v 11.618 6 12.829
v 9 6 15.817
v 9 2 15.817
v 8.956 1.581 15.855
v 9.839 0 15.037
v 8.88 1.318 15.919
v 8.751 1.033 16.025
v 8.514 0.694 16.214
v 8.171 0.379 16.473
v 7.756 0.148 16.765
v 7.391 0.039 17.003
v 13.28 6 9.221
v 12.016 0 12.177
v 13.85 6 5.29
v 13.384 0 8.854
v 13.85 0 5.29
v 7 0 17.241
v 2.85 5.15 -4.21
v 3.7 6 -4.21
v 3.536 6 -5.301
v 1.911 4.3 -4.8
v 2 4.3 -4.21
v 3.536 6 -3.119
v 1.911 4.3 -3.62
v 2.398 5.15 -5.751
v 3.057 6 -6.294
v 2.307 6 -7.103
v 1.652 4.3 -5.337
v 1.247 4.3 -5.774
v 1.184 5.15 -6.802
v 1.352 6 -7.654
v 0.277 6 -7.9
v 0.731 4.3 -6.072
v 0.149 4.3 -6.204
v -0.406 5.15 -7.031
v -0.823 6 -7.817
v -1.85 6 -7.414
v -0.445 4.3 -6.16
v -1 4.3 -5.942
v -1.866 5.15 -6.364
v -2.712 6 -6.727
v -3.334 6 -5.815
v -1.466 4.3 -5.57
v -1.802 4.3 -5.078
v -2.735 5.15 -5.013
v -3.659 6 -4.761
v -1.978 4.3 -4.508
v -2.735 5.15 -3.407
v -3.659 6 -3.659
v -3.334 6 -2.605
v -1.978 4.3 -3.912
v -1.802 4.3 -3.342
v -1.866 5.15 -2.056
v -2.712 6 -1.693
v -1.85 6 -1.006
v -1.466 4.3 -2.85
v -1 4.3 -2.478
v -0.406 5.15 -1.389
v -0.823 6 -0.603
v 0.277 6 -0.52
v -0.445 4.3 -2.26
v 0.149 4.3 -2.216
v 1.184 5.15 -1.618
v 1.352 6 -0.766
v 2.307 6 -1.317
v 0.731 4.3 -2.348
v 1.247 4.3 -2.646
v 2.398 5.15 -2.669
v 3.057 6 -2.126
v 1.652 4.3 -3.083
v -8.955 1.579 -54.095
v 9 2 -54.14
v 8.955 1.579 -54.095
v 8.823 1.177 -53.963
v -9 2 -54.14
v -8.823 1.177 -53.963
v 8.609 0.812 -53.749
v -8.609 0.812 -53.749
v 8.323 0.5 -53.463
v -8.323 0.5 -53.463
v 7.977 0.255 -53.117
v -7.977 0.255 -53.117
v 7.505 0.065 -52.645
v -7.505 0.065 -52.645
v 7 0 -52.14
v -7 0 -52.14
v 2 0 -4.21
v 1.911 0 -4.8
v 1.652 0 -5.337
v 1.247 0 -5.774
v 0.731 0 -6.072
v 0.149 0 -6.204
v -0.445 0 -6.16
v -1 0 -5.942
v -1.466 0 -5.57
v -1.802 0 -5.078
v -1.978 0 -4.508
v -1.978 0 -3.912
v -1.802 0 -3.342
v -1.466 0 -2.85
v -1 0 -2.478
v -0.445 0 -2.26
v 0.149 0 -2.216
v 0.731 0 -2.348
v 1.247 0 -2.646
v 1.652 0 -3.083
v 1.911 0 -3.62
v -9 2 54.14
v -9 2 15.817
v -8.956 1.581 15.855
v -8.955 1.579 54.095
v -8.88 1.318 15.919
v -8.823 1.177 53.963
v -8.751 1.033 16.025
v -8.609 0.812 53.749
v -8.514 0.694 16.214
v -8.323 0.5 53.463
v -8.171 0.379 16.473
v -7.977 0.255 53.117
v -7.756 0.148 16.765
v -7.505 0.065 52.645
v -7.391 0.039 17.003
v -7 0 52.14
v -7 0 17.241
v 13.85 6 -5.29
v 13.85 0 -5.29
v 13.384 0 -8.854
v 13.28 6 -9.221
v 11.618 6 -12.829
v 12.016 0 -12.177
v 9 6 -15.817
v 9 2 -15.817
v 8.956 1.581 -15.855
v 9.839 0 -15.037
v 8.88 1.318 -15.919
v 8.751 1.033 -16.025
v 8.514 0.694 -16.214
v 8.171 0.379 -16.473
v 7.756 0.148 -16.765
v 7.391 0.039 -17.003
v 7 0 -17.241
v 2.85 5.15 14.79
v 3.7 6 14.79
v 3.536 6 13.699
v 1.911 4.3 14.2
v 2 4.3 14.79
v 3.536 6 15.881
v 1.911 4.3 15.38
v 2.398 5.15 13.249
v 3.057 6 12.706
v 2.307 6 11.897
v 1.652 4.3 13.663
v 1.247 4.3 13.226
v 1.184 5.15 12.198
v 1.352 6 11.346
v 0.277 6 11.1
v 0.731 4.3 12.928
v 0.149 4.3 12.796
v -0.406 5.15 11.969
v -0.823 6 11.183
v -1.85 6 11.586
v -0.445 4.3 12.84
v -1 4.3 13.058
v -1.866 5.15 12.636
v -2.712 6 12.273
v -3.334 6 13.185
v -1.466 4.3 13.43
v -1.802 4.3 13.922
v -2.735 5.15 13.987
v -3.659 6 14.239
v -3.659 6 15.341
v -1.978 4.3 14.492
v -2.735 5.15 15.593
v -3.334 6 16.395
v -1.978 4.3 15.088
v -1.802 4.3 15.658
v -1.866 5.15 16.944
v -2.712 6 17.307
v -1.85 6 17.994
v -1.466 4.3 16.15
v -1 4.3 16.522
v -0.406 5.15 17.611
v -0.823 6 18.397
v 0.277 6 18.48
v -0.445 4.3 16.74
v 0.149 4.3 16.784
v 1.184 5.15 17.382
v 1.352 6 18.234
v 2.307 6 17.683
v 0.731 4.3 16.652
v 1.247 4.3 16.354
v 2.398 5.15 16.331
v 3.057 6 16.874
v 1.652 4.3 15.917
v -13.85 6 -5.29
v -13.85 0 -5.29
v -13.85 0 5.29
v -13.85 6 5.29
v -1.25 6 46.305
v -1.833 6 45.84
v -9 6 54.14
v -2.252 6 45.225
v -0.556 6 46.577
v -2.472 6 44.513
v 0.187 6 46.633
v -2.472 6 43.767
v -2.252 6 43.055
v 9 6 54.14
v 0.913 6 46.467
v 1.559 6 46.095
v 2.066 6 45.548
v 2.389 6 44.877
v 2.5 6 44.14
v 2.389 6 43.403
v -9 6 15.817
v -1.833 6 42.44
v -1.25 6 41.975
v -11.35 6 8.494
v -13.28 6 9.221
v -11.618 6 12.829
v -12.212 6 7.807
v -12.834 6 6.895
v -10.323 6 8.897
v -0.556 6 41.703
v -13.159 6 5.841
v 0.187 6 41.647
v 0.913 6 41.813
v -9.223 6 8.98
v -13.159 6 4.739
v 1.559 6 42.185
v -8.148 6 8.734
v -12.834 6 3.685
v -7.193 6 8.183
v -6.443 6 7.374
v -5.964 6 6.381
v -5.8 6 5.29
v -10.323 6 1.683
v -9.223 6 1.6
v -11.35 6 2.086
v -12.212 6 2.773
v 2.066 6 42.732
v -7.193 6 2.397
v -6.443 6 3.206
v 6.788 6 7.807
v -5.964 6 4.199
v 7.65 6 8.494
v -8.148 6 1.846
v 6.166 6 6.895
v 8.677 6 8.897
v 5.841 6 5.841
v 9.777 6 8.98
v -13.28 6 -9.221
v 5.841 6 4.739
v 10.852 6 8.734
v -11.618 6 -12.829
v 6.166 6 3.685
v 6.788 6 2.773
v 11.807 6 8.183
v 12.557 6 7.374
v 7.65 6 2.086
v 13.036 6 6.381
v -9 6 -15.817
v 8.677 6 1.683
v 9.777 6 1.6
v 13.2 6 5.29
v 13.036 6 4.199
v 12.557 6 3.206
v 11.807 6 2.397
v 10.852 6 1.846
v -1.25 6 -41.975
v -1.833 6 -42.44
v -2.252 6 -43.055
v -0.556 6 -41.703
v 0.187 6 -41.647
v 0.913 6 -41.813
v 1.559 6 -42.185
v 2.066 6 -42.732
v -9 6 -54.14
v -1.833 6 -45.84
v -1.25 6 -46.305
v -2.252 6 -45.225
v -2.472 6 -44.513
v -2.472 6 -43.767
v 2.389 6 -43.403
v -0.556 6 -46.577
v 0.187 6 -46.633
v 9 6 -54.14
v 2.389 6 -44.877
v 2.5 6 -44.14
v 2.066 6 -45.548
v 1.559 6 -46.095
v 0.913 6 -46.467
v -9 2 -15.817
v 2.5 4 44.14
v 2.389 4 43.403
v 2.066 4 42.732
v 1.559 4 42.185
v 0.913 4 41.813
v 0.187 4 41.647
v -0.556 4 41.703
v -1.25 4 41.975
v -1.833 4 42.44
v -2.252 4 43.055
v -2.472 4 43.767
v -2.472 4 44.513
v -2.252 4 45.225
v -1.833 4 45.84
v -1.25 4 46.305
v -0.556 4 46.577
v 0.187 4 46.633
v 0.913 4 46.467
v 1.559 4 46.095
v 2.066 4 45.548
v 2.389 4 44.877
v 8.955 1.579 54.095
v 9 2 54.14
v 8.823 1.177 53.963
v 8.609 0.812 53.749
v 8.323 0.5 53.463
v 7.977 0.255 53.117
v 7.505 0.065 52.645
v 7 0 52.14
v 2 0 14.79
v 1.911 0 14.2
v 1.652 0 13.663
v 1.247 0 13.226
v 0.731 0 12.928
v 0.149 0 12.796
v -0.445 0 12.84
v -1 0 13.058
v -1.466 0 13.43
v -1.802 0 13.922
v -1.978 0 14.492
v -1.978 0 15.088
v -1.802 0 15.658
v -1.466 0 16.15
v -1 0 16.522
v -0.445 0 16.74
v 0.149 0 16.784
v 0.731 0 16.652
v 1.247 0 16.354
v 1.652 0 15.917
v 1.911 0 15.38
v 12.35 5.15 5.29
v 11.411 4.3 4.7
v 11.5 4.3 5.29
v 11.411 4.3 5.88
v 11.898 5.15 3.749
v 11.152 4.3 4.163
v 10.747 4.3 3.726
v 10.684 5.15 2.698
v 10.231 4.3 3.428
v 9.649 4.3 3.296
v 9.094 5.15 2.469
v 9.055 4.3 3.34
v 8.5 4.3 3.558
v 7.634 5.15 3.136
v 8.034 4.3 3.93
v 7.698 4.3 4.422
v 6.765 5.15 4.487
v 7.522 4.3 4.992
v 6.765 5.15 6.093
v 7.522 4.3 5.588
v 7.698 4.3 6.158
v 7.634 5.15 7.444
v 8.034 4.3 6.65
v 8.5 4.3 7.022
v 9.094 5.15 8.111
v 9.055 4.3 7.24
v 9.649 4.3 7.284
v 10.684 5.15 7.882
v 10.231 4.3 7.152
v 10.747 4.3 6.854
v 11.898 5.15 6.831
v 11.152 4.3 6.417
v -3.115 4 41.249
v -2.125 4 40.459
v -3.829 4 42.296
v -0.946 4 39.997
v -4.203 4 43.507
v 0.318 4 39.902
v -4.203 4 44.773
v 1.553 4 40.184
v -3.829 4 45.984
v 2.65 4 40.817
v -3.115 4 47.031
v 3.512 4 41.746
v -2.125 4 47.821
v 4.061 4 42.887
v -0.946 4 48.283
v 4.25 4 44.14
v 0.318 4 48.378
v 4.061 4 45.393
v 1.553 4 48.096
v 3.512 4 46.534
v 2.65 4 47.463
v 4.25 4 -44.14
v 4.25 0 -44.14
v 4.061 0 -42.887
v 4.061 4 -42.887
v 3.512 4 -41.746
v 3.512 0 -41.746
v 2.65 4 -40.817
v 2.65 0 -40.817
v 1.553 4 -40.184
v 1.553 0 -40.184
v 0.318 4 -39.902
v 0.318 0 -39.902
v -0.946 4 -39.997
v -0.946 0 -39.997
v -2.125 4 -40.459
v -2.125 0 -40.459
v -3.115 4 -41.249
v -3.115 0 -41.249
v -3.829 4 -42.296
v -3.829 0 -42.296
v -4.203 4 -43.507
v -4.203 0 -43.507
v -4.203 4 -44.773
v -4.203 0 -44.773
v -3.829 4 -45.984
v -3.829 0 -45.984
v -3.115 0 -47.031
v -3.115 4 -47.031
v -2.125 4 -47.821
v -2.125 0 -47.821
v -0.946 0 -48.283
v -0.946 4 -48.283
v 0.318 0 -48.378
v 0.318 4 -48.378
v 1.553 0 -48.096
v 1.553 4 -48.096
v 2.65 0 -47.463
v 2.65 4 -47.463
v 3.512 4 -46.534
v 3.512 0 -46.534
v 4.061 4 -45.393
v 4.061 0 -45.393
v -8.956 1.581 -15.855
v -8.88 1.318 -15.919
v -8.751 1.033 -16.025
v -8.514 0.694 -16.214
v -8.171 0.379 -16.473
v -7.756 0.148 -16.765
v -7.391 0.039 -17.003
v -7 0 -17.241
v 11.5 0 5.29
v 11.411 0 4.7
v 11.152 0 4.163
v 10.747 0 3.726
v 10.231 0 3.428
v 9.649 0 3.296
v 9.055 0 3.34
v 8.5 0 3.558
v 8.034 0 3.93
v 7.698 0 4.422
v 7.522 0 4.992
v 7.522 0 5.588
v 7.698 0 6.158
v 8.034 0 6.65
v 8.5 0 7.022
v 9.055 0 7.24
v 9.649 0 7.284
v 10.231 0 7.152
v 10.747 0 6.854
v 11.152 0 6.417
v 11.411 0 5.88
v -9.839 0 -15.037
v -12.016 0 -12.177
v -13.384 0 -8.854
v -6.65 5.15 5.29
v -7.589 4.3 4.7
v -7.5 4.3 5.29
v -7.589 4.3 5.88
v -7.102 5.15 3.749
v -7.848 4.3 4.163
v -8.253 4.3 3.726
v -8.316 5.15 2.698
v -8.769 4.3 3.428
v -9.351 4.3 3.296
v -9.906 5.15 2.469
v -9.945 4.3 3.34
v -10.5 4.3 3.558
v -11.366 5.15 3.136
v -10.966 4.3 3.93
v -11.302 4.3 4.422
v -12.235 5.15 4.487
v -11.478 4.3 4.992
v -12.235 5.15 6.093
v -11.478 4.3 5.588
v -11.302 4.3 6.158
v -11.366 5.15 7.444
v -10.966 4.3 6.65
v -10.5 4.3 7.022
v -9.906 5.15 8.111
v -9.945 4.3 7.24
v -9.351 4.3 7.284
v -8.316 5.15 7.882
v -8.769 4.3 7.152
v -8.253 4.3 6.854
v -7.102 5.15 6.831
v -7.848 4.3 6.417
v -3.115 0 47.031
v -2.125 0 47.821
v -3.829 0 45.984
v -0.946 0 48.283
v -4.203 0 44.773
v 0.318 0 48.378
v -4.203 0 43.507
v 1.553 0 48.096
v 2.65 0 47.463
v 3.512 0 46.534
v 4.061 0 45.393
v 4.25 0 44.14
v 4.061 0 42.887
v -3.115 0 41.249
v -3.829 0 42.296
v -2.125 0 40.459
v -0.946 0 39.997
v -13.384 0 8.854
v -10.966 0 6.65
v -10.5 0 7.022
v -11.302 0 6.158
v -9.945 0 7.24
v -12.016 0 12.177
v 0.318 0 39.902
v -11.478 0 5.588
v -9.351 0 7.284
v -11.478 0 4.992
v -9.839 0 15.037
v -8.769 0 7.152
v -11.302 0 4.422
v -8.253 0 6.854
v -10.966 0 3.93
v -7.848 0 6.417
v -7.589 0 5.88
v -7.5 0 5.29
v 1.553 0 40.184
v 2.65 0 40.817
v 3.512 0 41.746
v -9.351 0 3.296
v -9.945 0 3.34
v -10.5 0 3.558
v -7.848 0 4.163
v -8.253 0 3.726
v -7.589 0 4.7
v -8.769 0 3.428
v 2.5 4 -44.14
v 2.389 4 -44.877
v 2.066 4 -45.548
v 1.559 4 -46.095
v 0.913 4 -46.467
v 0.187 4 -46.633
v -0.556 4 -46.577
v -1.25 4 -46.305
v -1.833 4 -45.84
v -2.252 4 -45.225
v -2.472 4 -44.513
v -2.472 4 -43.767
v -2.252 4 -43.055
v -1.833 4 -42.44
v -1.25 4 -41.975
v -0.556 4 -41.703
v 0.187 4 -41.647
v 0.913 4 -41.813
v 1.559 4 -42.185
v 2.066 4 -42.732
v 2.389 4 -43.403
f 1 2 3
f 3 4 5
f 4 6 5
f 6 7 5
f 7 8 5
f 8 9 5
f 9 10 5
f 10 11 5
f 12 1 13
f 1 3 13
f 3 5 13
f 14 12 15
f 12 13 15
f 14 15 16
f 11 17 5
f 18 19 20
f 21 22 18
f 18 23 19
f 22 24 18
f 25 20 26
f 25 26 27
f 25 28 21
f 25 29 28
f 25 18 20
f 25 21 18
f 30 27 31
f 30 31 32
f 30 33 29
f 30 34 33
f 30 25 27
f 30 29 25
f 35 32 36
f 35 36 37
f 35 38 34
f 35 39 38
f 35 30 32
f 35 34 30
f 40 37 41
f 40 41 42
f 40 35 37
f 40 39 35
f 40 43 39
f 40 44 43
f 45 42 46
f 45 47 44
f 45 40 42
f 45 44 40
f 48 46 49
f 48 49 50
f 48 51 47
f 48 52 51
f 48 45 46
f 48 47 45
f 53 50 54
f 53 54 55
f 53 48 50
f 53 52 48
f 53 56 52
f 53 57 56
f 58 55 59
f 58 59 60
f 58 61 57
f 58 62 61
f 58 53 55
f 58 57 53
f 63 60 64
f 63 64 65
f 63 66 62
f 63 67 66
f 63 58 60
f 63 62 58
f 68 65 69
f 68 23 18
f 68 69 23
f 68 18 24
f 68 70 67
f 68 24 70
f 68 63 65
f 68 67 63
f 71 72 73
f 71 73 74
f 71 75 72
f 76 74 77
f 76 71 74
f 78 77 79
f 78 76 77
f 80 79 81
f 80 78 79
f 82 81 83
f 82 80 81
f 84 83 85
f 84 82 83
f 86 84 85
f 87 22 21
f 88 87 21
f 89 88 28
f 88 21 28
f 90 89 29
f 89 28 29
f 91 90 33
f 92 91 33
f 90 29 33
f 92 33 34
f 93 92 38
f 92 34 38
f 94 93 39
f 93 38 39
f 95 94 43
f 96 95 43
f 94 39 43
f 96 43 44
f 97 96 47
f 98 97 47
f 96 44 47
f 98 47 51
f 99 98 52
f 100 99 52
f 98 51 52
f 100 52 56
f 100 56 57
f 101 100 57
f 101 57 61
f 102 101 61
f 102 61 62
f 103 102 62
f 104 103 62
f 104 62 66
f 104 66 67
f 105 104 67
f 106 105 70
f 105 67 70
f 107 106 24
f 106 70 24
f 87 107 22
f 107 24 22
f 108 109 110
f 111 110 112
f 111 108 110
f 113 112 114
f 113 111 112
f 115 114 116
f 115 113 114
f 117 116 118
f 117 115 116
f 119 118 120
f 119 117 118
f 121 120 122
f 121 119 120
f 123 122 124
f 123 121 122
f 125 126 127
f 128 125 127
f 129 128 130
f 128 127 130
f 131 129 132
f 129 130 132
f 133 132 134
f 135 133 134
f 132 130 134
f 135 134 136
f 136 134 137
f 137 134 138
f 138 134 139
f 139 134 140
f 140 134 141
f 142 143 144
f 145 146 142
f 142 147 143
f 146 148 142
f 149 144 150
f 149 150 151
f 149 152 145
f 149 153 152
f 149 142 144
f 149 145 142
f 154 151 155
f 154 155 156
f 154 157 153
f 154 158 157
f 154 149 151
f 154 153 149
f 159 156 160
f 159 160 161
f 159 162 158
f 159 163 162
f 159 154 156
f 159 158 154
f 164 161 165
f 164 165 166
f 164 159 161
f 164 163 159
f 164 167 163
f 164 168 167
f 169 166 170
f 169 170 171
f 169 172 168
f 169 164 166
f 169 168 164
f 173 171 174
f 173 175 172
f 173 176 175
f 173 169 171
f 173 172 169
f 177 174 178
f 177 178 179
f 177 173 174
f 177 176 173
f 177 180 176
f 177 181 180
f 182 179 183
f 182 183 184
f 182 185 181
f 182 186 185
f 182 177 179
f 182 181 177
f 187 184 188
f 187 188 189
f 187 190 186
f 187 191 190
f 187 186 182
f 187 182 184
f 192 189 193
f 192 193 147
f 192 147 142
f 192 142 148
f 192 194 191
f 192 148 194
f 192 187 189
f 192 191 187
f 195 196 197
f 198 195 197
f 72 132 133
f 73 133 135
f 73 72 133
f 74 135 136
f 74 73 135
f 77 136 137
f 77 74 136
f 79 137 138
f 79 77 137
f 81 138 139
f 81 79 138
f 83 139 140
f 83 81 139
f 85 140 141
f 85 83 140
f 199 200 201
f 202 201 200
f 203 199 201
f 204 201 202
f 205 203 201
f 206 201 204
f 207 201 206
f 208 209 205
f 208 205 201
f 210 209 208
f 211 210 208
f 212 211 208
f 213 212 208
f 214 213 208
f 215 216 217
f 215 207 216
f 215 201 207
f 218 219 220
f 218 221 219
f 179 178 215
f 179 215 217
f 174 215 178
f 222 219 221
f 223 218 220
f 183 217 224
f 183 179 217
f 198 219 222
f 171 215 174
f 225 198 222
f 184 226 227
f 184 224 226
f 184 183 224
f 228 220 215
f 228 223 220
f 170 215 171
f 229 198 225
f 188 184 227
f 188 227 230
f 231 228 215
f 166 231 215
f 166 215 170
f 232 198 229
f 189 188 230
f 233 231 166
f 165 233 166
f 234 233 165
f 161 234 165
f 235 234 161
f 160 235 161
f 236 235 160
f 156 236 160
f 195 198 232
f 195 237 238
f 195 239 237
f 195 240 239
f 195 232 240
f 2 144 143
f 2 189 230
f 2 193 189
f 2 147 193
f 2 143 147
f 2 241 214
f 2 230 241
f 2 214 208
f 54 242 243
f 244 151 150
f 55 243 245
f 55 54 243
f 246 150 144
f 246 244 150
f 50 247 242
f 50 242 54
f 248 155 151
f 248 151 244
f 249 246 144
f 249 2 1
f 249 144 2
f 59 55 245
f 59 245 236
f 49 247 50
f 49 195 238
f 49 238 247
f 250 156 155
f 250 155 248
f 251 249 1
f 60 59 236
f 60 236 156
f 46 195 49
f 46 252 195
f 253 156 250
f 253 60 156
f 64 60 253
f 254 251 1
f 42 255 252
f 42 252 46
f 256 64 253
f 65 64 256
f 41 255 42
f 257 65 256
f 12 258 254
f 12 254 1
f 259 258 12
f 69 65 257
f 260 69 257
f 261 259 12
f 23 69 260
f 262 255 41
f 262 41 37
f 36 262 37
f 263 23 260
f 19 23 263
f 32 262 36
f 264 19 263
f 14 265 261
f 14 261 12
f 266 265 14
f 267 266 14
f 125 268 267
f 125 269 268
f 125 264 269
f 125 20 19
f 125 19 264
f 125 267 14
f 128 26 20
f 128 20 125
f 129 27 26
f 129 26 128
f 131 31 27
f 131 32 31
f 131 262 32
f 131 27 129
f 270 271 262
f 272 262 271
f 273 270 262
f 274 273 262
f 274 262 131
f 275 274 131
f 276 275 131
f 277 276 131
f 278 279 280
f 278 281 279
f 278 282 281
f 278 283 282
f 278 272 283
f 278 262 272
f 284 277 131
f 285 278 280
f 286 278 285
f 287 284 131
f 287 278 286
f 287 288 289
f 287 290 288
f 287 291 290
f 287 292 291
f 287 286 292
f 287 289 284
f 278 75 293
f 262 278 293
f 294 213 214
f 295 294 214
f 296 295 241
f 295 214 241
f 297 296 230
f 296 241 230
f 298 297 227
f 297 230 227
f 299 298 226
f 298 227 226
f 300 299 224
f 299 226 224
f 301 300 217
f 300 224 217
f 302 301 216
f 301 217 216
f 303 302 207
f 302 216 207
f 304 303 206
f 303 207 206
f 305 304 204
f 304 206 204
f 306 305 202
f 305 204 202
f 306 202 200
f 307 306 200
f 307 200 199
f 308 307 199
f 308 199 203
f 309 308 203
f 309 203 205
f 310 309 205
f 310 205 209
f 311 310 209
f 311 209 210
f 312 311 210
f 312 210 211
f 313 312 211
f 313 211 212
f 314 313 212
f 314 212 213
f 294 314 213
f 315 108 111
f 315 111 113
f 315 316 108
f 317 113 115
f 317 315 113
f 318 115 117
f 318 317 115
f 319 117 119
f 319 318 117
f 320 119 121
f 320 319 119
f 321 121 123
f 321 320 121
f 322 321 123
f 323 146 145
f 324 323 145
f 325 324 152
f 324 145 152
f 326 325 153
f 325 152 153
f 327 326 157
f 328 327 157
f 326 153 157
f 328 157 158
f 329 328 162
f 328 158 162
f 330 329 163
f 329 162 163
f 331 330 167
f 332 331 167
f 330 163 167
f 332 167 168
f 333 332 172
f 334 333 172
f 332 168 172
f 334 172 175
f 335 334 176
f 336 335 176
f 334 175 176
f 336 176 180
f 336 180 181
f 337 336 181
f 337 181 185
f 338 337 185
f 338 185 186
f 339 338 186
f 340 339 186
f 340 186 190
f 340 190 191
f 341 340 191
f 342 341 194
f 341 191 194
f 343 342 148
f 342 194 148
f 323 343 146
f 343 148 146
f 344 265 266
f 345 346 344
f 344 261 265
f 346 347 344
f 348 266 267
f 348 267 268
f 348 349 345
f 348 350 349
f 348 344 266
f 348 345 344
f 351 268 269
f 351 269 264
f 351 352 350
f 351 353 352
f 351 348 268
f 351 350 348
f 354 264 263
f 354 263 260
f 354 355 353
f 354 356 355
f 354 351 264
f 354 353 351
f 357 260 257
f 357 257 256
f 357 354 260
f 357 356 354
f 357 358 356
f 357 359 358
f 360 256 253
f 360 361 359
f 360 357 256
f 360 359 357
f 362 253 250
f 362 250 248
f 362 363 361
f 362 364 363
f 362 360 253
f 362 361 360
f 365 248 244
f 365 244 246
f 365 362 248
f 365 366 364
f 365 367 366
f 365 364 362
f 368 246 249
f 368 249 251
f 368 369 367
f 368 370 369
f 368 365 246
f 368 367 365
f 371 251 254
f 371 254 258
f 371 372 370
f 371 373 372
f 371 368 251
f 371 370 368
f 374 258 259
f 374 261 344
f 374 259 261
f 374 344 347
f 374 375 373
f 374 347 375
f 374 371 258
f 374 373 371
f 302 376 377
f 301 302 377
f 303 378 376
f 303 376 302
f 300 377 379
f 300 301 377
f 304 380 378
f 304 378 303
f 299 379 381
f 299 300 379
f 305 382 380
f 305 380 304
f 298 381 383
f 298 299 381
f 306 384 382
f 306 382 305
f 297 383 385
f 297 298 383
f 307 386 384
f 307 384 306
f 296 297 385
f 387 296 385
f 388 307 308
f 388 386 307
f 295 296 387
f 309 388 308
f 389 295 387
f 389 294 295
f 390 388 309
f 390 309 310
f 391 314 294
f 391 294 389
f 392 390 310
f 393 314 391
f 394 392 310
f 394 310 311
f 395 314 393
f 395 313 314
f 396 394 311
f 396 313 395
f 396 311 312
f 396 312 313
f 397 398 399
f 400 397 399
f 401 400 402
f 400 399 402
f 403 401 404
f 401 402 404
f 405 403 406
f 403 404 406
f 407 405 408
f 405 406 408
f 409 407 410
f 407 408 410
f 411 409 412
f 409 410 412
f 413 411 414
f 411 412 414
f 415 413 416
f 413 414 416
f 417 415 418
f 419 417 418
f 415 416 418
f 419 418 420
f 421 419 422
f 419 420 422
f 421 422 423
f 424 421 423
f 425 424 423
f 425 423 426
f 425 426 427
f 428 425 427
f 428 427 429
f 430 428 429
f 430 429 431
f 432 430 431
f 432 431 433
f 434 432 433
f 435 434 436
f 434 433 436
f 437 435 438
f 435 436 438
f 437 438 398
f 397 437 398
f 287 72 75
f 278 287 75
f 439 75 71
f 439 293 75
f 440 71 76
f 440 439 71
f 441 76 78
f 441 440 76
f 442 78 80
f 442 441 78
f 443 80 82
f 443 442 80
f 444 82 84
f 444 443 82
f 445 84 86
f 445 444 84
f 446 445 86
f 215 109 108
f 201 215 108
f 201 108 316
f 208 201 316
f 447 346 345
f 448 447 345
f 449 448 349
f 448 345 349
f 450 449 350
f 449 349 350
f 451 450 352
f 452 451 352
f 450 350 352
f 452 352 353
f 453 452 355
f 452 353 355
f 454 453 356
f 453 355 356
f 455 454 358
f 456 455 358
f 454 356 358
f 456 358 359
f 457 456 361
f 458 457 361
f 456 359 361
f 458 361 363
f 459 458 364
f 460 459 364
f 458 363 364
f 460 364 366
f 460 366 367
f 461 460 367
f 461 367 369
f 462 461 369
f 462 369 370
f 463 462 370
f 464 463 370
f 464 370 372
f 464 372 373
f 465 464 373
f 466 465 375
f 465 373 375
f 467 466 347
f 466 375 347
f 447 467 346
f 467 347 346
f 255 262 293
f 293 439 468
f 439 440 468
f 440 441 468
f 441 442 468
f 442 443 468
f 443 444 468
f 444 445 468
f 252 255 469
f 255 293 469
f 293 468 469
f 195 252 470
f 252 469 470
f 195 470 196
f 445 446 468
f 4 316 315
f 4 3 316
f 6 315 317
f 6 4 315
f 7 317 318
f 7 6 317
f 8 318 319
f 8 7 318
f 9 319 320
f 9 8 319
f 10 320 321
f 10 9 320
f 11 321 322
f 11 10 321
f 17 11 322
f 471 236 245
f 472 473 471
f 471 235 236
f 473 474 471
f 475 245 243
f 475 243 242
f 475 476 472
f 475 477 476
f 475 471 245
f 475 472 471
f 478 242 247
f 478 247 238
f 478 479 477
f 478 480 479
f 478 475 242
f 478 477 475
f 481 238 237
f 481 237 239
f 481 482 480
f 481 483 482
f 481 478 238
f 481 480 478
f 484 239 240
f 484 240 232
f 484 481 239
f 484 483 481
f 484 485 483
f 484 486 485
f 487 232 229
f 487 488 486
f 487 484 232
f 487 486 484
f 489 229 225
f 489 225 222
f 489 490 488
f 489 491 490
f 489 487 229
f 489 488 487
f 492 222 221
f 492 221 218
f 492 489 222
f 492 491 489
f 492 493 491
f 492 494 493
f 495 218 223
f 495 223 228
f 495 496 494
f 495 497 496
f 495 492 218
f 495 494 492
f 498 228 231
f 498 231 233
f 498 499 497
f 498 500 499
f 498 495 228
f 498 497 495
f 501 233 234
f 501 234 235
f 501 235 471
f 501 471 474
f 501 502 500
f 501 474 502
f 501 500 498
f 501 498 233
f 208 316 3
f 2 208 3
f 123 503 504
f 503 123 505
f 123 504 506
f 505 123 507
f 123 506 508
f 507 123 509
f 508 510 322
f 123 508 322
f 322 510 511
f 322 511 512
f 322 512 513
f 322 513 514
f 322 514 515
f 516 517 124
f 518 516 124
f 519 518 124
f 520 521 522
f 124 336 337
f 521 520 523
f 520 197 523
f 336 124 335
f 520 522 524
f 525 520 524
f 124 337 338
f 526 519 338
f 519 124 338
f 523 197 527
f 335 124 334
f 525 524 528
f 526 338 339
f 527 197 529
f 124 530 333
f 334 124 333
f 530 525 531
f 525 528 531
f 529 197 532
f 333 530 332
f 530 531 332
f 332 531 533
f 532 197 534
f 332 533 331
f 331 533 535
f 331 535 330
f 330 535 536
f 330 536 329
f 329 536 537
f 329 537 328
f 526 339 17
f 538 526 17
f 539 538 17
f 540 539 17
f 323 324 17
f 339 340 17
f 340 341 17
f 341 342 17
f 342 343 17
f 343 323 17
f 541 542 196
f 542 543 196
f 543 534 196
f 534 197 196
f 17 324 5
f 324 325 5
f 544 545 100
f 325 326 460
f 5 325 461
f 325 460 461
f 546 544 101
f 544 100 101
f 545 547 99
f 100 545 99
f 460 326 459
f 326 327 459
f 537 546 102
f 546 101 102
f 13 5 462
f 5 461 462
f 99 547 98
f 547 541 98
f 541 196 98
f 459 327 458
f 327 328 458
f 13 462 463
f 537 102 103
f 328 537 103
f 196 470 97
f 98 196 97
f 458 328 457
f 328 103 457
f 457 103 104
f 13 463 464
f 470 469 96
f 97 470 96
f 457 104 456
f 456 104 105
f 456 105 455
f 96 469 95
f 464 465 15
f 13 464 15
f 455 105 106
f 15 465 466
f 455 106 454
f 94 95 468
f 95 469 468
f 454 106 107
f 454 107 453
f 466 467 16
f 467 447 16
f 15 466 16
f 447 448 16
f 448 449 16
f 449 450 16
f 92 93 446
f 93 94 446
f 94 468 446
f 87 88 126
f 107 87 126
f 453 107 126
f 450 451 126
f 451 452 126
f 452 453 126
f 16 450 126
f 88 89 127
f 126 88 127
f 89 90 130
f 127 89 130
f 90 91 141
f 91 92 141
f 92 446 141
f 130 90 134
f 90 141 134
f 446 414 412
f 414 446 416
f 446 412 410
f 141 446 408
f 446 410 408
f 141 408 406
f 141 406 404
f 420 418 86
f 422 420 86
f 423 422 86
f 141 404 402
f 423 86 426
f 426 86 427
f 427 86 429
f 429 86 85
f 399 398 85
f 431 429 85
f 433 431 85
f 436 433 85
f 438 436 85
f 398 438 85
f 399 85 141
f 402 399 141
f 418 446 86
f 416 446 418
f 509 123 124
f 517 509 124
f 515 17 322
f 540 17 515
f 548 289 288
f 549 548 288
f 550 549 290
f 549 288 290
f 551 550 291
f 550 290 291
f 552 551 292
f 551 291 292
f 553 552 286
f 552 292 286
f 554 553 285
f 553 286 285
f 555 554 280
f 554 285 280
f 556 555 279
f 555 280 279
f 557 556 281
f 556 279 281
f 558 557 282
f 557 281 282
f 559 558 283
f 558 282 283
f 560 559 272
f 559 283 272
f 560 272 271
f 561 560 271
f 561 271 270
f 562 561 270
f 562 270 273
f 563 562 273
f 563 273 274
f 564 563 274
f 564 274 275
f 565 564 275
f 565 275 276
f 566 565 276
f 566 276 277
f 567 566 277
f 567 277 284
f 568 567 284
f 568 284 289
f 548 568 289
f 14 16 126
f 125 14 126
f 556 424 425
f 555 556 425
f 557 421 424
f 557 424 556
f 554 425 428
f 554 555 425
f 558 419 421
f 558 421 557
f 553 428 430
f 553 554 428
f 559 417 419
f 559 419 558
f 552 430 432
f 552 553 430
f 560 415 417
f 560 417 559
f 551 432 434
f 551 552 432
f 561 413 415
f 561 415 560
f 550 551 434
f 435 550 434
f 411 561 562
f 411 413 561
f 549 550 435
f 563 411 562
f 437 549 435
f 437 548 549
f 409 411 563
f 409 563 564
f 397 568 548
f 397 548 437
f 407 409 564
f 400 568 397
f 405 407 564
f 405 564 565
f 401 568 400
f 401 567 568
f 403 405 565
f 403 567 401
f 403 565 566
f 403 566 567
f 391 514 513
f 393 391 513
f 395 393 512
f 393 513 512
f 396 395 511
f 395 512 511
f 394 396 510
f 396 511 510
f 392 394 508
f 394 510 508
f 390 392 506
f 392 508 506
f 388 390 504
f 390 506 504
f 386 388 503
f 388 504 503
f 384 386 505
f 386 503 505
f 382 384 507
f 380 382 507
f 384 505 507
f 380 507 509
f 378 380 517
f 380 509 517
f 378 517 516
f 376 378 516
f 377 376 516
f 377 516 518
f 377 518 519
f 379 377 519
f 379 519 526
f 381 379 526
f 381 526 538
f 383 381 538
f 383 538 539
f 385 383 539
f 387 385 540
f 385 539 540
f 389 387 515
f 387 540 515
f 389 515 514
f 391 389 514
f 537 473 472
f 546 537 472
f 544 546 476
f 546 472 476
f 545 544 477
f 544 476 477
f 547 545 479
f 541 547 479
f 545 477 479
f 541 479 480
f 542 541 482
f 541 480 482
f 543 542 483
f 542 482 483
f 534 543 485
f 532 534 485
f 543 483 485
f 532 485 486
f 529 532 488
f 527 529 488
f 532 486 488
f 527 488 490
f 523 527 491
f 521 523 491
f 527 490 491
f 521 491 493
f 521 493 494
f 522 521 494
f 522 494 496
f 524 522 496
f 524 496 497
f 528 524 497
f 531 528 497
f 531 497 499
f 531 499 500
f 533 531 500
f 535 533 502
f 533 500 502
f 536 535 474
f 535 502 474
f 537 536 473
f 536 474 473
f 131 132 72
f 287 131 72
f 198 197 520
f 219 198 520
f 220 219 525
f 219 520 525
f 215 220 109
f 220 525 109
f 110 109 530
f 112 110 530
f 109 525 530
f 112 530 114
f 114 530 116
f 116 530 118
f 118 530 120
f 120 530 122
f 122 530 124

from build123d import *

# Parameters (mm, degrees)
BOSS_EXTRUDE1_DEPTH = 6
SKETCH4_R           = 2.5
SKETCH4_R_2         = 2
CUT_EXTRUDE1_DEPTH  = 6
CHAMFER1_SIZE       = 1.7
FILLET1_R           = 2
SKETCH5_R           = 4.25
CUT_EXTRUDE2_DEPTH  = 4


with BuildPart() as part:
    # Sketch1 → Boss-Extrude1 (new body)
    with BuildSketch(Plane(origin=(0, 0, 0), x_dir=(1, 0, 0), z_dir=(0, 1, 0))):
        with BuildLine():
            Line((-13.85, 5.29), (-13.85, -5.29))
            ThreePointArc((-13.85, -5.29), (-12.5791991, -11.085364527), (-9, -15.817226605))
            Line((-9, -15.817226605), (-9, -54.14))
            Line((-9, -54.14), (9, -54.14))
            Line((9, -54.14), (9, -15.817226605))
            ThreePointArc((9, -15.817226605), (12.5791991, -11.085364527), (13.85, -5.29))
            Line((13.85, -5.29), (13.85, 5.29))
            ThreePointArc((13.85, 5.29), (12.5791991, 11.085364527), (9, 15.817226605))
            Line((9, 15.817226605), (9, 54.14))
            Line((9, 54.14), (-9, 54.14))
            Line((-9, 54.14), (-9, 15.817226605))
            ThreePointArc((-9, 15.817226605), (-12.5791991, 11.085364527), (-13.85, 5.29))
        make_face()
    extrude(amount=BOSS_EXTRUDE1_DEPTH)

    # Sketch4 → Cut-Extrude1 (cut)
    with BuildSketch(Plane(origin=(0, 6, 0), x_dir=(1, 0, 0), z_dir=(0, 1, 0))):
        with Locations((0, 44.14)):
            Circle(SKETCH4_R)
        with Locations((0, -44.14)):
            Circle(SKETCH4_R)
        with Locations((-9.5, -5.29)):
            Circle(SKETCH4_R_2)
        with Locations((9.5, -5.29)):
            Circle(SKETCH4_R_2)
        with Locations((0, 4.21)):
            Circle(SKETCH4_R_2)
        with Locations((0, -14.79)):
            Circle(SKETCH4_R_2)
    extrude(amount=-CUT_EXTRUDE1_DEPTH, mode=Mode.SUBTRACT)

    # Chamfer1
    chamfer1_edges = [part.edges().sort_by_distance(p)[0] for p in [
        (-2, 6, 14.79),
        (-11.5, 6, 5.29),
        (7.5, 6, 5.29),
        (-2, 6, -4.21),
    ]]
    chamfer(chamfer1_edges, length=CHAMFER1_SIZE)

    # Fillet1
    fillet1_edges = [part.edges().sort_by_distance(p)[0] for p in [
        (9, 0, 34.978613303),
        (0, 0, 54.14),
        (-9, 0, 34.978613303),
        (-9, 0, -34.978613303),
        (0, 0, -54.14),
        (9, 0, -34.978613303),
    ]]
    fillet(fillet1_edges, radius=FILLET1_R)

    # Sketch5 → Cut-Extrude2 (cut)
    with BuildSketch(Plane.XZ):
        with Locations((0, -44.14)):
            Circle(SKETCH5_R)
        with Locations((0, 44.14)):
            Circle(SKETCH5_R)
    extrude(amount=-CUT_EXTRUDE2_DEPTH, mode=Mode.SUBTRACT)


solid = part.part
